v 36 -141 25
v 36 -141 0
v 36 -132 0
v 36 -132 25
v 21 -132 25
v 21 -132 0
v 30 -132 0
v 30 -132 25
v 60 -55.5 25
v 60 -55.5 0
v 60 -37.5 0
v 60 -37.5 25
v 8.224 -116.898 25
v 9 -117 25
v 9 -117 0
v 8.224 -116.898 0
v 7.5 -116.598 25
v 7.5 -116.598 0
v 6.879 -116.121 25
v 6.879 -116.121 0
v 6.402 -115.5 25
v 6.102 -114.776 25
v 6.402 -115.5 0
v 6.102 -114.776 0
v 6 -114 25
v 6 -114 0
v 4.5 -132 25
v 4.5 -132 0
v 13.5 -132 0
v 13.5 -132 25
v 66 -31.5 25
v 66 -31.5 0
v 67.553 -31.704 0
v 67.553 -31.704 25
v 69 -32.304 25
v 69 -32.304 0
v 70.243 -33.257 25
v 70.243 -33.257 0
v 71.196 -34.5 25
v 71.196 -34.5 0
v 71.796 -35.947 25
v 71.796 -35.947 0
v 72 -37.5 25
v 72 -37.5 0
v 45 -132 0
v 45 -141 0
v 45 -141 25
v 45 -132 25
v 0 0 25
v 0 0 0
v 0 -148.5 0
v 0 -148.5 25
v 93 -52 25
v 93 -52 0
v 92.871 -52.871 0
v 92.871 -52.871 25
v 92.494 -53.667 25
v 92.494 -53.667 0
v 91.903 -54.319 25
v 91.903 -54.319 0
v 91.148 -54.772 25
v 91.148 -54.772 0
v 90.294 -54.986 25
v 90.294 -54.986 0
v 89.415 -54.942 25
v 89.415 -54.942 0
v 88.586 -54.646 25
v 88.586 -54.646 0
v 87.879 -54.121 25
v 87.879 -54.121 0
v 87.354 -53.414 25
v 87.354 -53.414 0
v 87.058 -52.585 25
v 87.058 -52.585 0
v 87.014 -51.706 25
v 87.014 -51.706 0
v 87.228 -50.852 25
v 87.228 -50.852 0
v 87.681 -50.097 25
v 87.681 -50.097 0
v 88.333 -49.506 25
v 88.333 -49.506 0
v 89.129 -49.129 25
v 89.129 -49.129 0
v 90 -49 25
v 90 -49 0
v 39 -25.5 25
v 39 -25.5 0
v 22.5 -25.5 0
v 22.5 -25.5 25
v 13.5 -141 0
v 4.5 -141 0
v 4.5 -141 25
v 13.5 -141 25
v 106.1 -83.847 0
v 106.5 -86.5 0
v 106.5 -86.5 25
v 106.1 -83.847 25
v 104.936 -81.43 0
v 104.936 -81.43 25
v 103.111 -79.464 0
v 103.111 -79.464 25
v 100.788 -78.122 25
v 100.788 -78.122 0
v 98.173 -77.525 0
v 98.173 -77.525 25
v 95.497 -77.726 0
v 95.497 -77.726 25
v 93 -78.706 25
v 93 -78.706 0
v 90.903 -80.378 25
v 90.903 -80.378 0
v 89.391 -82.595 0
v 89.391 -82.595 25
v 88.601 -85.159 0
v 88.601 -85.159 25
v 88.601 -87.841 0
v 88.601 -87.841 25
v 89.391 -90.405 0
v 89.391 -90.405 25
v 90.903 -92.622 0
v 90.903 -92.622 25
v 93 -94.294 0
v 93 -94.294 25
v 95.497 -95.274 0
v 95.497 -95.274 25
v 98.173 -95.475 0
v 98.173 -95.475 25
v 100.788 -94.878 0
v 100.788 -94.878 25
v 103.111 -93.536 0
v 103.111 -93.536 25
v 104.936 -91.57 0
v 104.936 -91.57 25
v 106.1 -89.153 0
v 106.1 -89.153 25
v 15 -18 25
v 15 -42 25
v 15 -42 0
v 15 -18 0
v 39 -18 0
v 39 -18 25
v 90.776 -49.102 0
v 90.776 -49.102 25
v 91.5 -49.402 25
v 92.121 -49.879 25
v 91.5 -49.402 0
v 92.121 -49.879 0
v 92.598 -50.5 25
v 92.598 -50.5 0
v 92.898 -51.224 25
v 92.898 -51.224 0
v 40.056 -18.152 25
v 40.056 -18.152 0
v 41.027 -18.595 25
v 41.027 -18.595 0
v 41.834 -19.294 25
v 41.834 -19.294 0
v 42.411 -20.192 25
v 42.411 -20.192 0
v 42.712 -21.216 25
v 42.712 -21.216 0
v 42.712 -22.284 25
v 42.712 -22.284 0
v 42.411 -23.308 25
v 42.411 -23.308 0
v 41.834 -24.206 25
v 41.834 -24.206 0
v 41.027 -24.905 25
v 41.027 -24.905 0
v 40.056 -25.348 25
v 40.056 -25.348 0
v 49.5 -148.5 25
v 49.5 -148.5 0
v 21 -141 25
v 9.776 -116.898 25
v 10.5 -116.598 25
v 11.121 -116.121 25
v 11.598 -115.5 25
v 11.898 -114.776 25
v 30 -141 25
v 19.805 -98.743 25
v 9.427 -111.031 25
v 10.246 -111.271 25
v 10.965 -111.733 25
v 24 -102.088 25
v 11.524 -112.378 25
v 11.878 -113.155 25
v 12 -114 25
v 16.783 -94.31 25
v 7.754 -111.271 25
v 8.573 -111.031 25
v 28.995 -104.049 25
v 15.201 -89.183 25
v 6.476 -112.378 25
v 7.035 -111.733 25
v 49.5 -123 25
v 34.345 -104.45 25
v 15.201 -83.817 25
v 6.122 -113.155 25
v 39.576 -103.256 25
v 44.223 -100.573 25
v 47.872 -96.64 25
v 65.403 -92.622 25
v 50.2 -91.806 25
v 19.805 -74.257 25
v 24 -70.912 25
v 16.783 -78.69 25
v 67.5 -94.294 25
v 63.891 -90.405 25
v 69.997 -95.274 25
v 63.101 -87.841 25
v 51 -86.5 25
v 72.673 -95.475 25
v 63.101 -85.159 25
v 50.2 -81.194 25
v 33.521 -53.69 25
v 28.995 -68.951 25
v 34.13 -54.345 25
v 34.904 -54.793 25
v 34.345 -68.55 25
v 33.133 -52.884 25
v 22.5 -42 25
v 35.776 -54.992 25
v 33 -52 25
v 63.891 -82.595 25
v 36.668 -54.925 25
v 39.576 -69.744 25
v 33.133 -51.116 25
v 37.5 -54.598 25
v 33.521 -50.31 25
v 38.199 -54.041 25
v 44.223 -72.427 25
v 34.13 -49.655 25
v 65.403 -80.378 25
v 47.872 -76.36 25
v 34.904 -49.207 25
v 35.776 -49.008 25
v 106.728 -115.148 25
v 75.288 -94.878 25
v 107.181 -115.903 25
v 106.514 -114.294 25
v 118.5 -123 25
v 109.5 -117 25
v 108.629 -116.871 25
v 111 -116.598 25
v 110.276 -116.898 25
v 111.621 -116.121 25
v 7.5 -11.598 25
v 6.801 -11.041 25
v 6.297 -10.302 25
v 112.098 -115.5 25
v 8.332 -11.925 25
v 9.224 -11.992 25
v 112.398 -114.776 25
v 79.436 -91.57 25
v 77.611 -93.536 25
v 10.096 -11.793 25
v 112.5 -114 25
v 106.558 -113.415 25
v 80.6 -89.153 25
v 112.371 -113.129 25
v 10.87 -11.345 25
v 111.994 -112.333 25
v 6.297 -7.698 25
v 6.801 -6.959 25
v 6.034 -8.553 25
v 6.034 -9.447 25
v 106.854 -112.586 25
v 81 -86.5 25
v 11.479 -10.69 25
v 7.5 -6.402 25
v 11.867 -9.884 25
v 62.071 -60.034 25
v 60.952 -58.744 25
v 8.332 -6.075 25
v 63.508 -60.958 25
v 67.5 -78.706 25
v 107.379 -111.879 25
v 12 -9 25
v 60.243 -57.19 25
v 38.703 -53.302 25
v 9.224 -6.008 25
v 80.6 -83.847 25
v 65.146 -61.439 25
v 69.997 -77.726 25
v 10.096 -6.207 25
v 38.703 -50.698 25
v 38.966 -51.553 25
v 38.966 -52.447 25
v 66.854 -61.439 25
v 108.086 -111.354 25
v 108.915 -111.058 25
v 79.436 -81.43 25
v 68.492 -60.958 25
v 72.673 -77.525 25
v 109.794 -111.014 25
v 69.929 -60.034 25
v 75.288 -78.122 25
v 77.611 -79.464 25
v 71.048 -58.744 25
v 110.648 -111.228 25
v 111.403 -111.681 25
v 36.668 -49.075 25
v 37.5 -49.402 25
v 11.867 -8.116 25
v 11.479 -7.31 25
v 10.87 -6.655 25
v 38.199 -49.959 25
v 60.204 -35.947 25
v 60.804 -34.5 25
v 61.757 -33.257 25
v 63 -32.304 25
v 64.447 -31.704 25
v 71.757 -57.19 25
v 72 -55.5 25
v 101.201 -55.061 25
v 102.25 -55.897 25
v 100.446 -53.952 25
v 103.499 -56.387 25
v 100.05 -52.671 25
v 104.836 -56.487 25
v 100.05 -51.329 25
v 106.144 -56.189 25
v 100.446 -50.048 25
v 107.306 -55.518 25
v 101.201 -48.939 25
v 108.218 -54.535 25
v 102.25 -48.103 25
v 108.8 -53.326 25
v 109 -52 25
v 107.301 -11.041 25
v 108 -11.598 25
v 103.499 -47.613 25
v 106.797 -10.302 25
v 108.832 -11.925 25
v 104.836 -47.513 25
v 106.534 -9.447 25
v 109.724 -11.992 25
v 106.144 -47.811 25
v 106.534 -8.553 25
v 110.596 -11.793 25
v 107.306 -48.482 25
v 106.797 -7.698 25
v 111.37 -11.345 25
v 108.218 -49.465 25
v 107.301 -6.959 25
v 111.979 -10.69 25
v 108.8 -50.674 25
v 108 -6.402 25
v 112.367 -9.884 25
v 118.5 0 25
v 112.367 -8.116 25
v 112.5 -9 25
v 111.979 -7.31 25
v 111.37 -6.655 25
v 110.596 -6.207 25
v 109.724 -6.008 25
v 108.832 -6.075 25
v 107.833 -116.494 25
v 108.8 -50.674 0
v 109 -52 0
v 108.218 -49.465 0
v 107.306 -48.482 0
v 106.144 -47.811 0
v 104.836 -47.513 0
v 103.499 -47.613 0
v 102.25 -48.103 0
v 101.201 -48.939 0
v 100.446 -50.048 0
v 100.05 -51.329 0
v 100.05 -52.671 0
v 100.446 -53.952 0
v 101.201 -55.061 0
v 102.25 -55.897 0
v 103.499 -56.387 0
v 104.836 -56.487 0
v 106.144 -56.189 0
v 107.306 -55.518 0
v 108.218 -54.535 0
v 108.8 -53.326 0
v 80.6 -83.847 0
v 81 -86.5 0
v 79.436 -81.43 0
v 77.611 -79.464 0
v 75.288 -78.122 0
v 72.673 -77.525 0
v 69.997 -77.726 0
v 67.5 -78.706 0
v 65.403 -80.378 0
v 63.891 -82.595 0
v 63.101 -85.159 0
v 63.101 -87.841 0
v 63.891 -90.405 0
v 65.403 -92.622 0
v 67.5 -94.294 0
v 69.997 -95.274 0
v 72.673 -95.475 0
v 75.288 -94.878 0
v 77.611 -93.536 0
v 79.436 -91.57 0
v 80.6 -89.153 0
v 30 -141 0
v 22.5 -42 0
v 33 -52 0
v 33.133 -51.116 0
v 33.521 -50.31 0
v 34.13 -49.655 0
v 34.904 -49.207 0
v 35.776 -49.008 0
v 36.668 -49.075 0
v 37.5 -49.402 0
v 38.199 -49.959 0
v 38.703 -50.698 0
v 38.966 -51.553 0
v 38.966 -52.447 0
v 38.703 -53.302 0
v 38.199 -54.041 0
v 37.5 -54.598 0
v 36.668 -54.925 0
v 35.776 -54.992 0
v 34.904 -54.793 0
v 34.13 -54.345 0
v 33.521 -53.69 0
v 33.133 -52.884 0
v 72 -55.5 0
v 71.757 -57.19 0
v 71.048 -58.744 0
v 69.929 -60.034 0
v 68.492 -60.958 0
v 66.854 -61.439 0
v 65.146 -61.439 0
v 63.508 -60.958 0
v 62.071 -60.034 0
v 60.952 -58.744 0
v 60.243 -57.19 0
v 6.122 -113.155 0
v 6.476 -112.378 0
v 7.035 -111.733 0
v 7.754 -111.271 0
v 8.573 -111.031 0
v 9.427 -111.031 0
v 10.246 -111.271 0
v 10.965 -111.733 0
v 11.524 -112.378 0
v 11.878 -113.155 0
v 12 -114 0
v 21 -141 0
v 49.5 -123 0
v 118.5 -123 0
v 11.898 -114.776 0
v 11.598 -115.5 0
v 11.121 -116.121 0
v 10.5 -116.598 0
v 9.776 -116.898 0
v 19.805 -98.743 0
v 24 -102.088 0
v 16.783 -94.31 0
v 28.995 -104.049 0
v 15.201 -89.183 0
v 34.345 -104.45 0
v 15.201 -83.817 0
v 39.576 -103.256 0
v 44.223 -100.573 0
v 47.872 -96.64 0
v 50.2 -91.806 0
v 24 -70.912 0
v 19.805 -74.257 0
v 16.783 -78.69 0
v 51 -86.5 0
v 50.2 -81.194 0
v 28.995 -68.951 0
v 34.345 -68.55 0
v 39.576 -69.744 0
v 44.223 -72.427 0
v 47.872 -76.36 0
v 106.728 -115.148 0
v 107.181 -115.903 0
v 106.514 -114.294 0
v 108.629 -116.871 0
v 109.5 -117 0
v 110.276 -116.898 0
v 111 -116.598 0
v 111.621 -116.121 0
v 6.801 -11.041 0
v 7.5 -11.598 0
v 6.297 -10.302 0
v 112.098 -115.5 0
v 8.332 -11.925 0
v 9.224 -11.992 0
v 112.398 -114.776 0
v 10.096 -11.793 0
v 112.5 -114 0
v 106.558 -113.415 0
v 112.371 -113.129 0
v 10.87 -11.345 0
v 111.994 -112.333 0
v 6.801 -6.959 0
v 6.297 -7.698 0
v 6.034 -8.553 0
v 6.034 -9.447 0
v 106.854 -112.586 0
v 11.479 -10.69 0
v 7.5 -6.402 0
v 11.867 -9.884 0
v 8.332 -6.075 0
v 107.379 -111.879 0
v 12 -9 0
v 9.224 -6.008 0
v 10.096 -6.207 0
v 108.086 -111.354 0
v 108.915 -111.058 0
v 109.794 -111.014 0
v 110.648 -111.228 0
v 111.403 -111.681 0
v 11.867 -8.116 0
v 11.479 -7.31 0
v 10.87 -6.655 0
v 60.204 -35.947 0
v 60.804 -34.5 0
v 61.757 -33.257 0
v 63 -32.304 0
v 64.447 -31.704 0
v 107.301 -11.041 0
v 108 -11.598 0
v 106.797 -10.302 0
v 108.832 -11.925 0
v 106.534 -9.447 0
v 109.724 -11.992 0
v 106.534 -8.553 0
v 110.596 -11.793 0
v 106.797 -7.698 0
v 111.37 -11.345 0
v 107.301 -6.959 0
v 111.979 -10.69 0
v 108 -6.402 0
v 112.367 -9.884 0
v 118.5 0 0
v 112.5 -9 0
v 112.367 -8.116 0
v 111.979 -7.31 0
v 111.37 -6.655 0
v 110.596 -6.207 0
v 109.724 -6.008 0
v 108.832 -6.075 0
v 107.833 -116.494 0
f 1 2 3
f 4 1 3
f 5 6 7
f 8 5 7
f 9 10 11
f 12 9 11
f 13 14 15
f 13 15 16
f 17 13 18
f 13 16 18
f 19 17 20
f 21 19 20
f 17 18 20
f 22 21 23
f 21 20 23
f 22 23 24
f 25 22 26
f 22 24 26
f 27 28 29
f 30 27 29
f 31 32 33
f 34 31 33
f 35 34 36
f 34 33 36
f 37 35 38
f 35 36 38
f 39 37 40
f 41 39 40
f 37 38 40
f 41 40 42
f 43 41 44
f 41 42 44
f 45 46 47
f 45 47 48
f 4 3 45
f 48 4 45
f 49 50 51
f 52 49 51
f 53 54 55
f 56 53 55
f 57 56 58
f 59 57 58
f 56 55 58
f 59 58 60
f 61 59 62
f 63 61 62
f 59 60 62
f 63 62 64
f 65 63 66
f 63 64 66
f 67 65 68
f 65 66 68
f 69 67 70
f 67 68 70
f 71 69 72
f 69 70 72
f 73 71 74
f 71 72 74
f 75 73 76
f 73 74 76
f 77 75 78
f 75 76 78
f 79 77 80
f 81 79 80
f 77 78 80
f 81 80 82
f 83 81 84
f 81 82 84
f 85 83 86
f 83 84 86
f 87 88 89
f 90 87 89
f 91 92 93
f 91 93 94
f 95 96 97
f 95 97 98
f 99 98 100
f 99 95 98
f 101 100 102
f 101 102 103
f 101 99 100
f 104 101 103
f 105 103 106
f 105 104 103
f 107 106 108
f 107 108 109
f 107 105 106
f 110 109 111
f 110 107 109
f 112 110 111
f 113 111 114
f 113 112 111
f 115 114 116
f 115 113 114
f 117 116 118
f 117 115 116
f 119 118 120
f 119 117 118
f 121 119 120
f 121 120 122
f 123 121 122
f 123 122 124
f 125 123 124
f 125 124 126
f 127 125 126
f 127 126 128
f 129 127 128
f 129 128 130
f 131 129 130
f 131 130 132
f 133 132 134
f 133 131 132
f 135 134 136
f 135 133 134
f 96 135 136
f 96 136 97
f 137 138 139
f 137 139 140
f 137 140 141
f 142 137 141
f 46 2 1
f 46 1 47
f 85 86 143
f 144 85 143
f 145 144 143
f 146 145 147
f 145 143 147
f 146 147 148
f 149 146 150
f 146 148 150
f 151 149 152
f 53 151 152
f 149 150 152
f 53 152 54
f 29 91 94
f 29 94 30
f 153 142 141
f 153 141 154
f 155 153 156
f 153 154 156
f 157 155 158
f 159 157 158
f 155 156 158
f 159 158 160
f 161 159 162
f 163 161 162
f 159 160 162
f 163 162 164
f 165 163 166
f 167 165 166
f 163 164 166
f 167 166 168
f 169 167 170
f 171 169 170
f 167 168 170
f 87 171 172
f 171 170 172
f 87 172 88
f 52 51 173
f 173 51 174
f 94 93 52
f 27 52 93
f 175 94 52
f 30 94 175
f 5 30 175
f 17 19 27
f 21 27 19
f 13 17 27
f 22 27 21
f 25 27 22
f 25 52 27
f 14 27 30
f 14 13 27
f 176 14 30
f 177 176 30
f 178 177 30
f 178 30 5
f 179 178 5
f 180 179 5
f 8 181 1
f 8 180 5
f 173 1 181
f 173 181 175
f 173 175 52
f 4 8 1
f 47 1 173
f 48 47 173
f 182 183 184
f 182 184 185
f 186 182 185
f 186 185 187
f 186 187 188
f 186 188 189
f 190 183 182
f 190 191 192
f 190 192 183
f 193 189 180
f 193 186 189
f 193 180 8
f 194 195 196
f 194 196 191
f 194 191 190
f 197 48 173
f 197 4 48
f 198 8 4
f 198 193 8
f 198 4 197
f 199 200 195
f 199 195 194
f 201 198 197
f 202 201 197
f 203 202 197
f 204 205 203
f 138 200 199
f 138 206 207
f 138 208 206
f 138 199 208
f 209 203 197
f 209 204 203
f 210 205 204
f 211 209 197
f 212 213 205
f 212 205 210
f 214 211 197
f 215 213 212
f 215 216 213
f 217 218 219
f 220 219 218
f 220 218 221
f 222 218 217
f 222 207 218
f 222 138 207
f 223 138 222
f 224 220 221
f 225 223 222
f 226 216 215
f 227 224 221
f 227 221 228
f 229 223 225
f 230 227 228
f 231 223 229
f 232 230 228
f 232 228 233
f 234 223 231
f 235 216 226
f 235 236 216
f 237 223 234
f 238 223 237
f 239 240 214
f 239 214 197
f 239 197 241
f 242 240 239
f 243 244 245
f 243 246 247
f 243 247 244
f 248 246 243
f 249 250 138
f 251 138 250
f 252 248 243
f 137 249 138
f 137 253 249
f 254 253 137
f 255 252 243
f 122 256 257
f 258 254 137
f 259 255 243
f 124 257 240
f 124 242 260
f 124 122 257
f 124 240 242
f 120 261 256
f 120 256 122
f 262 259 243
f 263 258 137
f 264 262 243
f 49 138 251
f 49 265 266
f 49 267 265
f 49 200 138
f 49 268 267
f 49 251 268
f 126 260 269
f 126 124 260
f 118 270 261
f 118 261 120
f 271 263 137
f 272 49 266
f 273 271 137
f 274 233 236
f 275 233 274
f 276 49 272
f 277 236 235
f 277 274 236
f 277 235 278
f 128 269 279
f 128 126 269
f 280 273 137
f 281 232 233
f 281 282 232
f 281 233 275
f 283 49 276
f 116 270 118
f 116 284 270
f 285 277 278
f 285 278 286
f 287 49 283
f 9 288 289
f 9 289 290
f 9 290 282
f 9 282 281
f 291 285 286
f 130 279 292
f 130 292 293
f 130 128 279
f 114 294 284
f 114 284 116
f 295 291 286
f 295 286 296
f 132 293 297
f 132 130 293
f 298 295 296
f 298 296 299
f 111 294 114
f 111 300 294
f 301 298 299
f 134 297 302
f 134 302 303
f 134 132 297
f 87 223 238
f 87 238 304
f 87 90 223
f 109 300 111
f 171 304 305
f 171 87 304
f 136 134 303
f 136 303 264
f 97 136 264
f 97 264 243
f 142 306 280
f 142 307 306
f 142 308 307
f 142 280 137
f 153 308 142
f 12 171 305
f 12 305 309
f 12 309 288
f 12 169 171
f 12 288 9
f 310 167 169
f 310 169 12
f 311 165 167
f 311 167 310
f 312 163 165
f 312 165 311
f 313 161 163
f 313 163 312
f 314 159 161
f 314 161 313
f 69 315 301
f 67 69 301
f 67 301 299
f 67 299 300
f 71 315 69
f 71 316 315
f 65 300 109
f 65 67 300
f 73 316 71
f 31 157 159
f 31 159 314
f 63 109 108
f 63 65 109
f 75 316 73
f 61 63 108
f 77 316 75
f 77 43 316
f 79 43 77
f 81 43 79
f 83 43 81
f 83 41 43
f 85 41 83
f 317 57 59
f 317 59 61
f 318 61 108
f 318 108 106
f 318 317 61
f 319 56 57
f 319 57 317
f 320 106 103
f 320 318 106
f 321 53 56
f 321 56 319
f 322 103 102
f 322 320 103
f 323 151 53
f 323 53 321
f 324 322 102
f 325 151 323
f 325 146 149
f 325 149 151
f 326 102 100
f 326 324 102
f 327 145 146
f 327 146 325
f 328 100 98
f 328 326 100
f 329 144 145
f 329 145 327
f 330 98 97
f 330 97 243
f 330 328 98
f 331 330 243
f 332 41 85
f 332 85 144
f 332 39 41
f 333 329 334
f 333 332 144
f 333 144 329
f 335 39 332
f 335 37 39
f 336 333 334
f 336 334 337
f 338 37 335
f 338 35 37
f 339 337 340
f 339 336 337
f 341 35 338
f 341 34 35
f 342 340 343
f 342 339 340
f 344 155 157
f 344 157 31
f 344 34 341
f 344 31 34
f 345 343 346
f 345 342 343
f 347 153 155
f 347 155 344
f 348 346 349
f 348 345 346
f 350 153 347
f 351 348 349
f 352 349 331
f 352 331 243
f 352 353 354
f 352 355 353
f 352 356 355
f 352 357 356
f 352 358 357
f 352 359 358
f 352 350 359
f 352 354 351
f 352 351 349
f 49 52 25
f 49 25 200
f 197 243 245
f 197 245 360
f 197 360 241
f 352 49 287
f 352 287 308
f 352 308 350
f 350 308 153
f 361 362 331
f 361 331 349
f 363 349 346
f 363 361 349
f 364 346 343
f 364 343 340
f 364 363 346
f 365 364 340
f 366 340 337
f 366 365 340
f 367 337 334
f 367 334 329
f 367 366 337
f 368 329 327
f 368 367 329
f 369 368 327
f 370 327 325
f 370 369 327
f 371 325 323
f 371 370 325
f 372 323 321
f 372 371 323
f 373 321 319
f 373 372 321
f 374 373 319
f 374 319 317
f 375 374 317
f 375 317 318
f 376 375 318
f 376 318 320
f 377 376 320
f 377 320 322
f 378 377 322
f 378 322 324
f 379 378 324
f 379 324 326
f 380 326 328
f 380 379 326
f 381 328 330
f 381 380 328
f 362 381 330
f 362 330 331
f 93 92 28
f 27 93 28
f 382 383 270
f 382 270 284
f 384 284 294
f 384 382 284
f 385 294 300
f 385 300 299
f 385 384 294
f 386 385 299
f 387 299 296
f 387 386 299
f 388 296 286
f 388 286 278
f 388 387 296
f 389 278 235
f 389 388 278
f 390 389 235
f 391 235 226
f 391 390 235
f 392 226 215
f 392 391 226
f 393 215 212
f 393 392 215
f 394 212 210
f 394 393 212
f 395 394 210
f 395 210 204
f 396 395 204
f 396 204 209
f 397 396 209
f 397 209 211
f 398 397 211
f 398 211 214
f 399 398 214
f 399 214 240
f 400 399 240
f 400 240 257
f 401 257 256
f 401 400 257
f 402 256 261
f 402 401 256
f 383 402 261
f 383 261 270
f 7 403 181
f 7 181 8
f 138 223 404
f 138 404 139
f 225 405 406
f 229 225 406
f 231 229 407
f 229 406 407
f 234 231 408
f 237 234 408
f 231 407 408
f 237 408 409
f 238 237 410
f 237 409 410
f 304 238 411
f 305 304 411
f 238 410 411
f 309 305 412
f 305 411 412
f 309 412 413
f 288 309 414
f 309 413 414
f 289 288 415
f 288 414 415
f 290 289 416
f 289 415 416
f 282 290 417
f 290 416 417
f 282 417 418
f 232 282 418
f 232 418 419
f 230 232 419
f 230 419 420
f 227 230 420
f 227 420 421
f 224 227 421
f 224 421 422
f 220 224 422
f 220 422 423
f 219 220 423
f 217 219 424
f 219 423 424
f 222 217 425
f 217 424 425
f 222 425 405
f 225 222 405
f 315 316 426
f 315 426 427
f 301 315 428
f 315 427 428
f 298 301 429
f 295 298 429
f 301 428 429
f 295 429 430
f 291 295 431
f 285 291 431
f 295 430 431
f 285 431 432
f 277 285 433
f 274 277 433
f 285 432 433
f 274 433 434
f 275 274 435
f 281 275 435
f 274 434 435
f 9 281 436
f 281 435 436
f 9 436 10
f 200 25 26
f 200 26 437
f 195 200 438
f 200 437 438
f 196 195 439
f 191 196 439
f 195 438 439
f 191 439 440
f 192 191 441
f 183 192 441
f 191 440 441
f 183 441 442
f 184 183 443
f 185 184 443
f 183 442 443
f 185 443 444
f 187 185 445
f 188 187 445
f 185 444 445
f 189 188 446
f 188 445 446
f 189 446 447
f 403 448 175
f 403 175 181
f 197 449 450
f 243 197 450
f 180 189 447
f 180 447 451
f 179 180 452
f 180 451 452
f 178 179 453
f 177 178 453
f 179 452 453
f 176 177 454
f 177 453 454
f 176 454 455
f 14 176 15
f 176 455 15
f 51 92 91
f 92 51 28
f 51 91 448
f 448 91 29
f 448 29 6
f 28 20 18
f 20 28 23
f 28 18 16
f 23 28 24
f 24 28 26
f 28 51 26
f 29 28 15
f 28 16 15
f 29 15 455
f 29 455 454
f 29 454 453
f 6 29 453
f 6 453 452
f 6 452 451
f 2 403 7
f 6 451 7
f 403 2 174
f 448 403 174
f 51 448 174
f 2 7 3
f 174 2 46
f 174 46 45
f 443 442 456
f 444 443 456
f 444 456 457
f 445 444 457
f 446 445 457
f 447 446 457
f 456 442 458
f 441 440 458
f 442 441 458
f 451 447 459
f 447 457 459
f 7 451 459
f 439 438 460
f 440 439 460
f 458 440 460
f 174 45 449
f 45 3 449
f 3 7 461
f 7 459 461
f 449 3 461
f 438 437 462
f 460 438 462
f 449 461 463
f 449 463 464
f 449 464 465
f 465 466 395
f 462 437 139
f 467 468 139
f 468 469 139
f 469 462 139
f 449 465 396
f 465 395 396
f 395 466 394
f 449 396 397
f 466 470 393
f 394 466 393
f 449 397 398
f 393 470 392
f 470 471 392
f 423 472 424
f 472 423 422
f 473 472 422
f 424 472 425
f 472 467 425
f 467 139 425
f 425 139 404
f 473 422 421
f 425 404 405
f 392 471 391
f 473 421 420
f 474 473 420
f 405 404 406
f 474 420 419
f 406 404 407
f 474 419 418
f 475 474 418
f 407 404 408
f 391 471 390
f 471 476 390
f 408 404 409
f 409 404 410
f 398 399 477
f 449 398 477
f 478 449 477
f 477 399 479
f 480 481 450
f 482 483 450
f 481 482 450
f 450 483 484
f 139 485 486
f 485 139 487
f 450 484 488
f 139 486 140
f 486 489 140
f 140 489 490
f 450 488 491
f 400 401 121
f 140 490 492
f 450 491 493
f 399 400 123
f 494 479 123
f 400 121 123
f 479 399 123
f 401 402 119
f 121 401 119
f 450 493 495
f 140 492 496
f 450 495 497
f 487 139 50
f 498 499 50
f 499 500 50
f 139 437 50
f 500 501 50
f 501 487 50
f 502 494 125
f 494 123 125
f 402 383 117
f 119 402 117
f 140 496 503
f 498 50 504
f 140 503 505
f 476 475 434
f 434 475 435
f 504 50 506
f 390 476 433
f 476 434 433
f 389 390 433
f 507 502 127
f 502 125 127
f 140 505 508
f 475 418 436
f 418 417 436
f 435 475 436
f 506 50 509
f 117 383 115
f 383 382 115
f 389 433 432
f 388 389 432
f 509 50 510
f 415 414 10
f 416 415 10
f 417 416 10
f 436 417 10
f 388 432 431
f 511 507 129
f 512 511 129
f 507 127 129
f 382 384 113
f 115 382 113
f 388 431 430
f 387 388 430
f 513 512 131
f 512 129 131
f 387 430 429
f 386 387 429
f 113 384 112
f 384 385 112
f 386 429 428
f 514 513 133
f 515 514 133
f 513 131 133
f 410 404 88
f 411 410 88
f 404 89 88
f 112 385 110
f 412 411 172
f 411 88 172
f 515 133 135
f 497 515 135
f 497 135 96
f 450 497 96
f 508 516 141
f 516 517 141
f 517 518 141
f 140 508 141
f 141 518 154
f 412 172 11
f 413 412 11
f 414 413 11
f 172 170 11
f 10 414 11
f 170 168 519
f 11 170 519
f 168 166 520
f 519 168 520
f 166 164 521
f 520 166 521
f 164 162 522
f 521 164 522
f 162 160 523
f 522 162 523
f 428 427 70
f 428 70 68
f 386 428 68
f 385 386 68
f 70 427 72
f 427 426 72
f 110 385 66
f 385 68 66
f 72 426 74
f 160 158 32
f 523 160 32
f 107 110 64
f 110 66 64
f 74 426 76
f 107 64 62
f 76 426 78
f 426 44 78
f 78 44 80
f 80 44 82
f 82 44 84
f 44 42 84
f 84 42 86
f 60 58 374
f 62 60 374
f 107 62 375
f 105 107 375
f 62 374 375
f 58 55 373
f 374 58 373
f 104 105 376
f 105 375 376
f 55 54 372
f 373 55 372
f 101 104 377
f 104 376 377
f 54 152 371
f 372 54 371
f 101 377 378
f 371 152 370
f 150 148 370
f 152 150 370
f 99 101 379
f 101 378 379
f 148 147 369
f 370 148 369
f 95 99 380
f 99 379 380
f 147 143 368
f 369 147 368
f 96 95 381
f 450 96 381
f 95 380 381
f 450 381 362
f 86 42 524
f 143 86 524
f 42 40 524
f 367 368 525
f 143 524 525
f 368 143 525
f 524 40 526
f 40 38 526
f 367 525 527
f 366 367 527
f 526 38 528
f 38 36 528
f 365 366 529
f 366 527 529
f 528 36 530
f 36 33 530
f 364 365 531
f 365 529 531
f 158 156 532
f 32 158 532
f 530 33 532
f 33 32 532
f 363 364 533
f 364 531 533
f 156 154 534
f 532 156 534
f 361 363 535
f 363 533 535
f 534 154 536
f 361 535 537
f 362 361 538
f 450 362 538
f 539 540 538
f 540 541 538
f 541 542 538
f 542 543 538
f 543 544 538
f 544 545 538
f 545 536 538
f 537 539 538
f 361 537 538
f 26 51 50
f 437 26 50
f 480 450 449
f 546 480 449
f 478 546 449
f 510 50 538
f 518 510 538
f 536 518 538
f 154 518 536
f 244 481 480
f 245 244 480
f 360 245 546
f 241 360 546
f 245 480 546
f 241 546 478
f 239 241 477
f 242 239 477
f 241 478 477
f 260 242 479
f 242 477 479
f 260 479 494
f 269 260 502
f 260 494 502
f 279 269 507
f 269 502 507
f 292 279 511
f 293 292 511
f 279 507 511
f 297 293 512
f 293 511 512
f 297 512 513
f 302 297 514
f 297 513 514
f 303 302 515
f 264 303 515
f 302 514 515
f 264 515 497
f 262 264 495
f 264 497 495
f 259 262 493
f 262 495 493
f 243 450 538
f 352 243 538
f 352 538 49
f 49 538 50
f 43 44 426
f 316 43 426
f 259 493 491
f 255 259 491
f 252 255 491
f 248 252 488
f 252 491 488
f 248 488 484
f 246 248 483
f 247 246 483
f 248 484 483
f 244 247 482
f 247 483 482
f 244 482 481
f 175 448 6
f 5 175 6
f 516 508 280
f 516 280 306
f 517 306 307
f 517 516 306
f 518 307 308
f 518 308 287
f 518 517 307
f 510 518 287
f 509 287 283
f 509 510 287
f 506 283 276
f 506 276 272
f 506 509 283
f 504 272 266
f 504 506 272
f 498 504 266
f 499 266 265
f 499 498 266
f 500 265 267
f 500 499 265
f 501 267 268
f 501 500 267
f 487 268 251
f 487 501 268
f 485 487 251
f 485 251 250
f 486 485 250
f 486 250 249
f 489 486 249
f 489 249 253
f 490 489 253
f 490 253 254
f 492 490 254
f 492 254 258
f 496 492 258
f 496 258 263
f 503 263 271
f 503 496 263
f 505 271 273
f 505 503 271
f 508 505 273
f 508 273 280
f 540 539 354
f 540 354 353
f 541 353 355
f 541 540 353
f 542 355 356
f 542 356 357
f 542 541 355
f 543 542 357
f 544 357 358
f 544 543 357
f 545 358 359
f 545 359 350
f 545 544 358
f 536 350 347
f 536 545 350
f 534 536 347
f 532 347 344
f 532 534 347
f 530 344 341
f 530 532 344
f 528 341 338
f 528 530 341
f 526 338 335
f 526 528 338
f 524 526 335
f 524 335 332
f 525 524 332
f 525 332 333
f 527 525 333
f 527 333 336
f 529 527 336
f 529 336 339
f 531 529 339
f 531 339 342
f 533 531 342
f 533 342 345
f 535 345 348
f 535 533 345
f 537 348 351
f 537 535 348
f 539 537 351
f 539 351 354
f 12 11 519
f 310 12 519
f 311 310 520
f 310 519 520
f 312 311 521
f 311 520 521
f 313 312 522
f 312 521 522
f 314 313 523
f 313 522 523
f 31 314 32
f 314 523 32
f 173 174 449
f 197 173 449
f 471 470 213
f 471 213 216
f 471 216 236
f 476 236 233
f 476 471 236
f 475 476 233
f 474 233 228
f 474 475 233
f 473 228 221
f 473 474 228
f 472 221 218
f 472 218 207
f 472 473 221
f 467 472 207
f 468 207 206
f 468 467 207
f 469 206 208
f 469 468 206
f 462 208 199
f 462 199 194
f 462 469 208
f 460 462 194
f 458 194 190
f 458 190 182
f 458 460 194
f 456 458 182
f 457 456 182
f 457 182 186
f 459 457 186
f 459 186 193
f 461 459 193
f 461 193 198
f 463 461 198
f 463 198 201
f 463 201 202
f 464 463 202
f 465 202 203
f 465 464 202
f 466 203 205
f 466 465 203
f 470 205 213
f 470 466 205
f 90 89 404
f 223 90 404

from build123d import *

# Parameters (mm, degrees)
F0_W     = 9
F0_H     = 9
F0_R     = 18
F0_R_2   = 9
F0_R_3   = 3
F0_R_4   = 4.5
F1_DEPTH = 25


with BuildPart() as f1:
    # F0 (on Top) → F1 (new body)
    with BuildSketch(Plane.XY):
        with BuildLine():
            Line((9, 0), (0, 0))
            Line((0, 0), (0, -9))
            Line((0, -9), (0, -18))
            Line((0, -18), (0, -52))
            Line((0, -52), (0, -114))
            Line((0, -114), (0, -132))
            Line((0, -132), (0, -148.5))
            Line((0, -148.5), (49.5, -148.5))
            Line((49.5, -148.5), (49.5, -123))
            Line((49.5, -123), (109.5, -123))
            Line((109.5, -123), (109.5, -117))
            ThreePointArc((109.5, -117), (107.3786796564, -111.8786796564), (112.5, -114))
            Line((112.5, -114), (118.5, -114))
            Line((118.5, -114), (118.5, -86.5))
            Line((118.5, -86.5), (118.5, -9))
            Line((118.5, -9), (118.5, 0))
            Line((118.5, 0), (109.5, 0))
            Line((109.5, 0), (90, 0))
            Line((90, 0), (66, 0))
            Line((66, 0), (39, 0))
            Line((39, 0), (9, 0))
        make_face()
        with Locations((9, -136.5)):
            Rectangle(F0_W, F0_H, mode=Mode.SUBTRACT)
        with Locations((25.5, -136.5)):
            Rectangle(F0_W, F0_H, mode=Mode.SUBTRACT)
        with BuildLine():
            ThreePointArc((9, -117), (6.8786796564, -116.1213203436), (6, -114))
            ThreePointArc((6, -114), (9, -111), (12, -114))
            ThreePointArc((12, -114), (11.1213203436, -116.1213203436), (9, -117))
        make_face(mode=Mode.SUBTRACT)
        with Locations((40.5, -136.5)):
            Rectangle(F0_W, F0_H, mode=Mode.SUBTRACT)
        with Locations((33, -86.5)):
            Circle(F0_R, mode=Mode.SUBTRACT)
        with Locations((72, -86.5)):
            Circle(F0_R_2, mode=Mode.SUBTRACT)
        with Locations((97.5, -86.5)):
            Circle(F0_R_2, mode=Mode.SUBTRACT)
        with BuildLine():
            ThreePointArc((39, -52), (36, -55), (33, -52))
            ThreePointArc((33, -52), (36, -49), (39, -52))
        make_face(mode=Mode.SUBTRACT)
        with BuildLine():
            Line((15, -18), (39, -18))
            ThreePointArc((39, -18), (42.75, -21.75), (39, -25.5))
            Line((39, -25.5), (22.5, -25.5))
            Line((22.5, -25.5), (22.5, -42))
            Line((22.5, -42), (15, -42))
            Line((15, -42), (15, -18))
        make_face(mode=Mode.SUBTRACT)
        with Locations((9, -9)):
            Circle(F0_R_3, mode=Mode.SUBTRACT)
        with BuildLine():
            ThreePointArc((66, -31.5), (70.2426406871, -33.2573593129), (72, -37.5))
            Line((72, -37.5), (72, -55.5))
            ThreePointArc((72, -55.5), (66, -61.5), (60, -55.5))
            Line((60, -55.5), (60, -37.5))
            ThreePointArc((60, -37.5), (61.7573593129, -33.2573593129), (66, -31.5))
        make_face(mode=Mode.SUBTRACT)
        with BuildLine():
            ThreePointArc((90, -49), (92.1213203436, -49.8786796564), (93, -52))
            ThreePointArc((93, -52), (87.8786796564, -54.1213203436), (90, -49))
        make_face(mode=Mode.SUBTRACT)
        with Locations((104.5, -52)):
            Circle(F0_R_4, mode=Mode.SUBTRACT)
        with Locations((109.5, -9)):
            Circle(F0_R_3, mode=Mode.SUBTRACT)
        with BuildLine():
            Line((118.5, -123), (118.5, -114))
            Line((118.5, -114), (112.5, -114))
            ThreePointArc((112.5, -114), (111.6213203436, -116.1213203436), (109.5, -117))
            Line((109.5, -117), (109.5, -123))
            Line((109.5, -123), (118.5, -123))
        make_face()
    extrude(amount=F1_DEPTH)


solid = f1.part
